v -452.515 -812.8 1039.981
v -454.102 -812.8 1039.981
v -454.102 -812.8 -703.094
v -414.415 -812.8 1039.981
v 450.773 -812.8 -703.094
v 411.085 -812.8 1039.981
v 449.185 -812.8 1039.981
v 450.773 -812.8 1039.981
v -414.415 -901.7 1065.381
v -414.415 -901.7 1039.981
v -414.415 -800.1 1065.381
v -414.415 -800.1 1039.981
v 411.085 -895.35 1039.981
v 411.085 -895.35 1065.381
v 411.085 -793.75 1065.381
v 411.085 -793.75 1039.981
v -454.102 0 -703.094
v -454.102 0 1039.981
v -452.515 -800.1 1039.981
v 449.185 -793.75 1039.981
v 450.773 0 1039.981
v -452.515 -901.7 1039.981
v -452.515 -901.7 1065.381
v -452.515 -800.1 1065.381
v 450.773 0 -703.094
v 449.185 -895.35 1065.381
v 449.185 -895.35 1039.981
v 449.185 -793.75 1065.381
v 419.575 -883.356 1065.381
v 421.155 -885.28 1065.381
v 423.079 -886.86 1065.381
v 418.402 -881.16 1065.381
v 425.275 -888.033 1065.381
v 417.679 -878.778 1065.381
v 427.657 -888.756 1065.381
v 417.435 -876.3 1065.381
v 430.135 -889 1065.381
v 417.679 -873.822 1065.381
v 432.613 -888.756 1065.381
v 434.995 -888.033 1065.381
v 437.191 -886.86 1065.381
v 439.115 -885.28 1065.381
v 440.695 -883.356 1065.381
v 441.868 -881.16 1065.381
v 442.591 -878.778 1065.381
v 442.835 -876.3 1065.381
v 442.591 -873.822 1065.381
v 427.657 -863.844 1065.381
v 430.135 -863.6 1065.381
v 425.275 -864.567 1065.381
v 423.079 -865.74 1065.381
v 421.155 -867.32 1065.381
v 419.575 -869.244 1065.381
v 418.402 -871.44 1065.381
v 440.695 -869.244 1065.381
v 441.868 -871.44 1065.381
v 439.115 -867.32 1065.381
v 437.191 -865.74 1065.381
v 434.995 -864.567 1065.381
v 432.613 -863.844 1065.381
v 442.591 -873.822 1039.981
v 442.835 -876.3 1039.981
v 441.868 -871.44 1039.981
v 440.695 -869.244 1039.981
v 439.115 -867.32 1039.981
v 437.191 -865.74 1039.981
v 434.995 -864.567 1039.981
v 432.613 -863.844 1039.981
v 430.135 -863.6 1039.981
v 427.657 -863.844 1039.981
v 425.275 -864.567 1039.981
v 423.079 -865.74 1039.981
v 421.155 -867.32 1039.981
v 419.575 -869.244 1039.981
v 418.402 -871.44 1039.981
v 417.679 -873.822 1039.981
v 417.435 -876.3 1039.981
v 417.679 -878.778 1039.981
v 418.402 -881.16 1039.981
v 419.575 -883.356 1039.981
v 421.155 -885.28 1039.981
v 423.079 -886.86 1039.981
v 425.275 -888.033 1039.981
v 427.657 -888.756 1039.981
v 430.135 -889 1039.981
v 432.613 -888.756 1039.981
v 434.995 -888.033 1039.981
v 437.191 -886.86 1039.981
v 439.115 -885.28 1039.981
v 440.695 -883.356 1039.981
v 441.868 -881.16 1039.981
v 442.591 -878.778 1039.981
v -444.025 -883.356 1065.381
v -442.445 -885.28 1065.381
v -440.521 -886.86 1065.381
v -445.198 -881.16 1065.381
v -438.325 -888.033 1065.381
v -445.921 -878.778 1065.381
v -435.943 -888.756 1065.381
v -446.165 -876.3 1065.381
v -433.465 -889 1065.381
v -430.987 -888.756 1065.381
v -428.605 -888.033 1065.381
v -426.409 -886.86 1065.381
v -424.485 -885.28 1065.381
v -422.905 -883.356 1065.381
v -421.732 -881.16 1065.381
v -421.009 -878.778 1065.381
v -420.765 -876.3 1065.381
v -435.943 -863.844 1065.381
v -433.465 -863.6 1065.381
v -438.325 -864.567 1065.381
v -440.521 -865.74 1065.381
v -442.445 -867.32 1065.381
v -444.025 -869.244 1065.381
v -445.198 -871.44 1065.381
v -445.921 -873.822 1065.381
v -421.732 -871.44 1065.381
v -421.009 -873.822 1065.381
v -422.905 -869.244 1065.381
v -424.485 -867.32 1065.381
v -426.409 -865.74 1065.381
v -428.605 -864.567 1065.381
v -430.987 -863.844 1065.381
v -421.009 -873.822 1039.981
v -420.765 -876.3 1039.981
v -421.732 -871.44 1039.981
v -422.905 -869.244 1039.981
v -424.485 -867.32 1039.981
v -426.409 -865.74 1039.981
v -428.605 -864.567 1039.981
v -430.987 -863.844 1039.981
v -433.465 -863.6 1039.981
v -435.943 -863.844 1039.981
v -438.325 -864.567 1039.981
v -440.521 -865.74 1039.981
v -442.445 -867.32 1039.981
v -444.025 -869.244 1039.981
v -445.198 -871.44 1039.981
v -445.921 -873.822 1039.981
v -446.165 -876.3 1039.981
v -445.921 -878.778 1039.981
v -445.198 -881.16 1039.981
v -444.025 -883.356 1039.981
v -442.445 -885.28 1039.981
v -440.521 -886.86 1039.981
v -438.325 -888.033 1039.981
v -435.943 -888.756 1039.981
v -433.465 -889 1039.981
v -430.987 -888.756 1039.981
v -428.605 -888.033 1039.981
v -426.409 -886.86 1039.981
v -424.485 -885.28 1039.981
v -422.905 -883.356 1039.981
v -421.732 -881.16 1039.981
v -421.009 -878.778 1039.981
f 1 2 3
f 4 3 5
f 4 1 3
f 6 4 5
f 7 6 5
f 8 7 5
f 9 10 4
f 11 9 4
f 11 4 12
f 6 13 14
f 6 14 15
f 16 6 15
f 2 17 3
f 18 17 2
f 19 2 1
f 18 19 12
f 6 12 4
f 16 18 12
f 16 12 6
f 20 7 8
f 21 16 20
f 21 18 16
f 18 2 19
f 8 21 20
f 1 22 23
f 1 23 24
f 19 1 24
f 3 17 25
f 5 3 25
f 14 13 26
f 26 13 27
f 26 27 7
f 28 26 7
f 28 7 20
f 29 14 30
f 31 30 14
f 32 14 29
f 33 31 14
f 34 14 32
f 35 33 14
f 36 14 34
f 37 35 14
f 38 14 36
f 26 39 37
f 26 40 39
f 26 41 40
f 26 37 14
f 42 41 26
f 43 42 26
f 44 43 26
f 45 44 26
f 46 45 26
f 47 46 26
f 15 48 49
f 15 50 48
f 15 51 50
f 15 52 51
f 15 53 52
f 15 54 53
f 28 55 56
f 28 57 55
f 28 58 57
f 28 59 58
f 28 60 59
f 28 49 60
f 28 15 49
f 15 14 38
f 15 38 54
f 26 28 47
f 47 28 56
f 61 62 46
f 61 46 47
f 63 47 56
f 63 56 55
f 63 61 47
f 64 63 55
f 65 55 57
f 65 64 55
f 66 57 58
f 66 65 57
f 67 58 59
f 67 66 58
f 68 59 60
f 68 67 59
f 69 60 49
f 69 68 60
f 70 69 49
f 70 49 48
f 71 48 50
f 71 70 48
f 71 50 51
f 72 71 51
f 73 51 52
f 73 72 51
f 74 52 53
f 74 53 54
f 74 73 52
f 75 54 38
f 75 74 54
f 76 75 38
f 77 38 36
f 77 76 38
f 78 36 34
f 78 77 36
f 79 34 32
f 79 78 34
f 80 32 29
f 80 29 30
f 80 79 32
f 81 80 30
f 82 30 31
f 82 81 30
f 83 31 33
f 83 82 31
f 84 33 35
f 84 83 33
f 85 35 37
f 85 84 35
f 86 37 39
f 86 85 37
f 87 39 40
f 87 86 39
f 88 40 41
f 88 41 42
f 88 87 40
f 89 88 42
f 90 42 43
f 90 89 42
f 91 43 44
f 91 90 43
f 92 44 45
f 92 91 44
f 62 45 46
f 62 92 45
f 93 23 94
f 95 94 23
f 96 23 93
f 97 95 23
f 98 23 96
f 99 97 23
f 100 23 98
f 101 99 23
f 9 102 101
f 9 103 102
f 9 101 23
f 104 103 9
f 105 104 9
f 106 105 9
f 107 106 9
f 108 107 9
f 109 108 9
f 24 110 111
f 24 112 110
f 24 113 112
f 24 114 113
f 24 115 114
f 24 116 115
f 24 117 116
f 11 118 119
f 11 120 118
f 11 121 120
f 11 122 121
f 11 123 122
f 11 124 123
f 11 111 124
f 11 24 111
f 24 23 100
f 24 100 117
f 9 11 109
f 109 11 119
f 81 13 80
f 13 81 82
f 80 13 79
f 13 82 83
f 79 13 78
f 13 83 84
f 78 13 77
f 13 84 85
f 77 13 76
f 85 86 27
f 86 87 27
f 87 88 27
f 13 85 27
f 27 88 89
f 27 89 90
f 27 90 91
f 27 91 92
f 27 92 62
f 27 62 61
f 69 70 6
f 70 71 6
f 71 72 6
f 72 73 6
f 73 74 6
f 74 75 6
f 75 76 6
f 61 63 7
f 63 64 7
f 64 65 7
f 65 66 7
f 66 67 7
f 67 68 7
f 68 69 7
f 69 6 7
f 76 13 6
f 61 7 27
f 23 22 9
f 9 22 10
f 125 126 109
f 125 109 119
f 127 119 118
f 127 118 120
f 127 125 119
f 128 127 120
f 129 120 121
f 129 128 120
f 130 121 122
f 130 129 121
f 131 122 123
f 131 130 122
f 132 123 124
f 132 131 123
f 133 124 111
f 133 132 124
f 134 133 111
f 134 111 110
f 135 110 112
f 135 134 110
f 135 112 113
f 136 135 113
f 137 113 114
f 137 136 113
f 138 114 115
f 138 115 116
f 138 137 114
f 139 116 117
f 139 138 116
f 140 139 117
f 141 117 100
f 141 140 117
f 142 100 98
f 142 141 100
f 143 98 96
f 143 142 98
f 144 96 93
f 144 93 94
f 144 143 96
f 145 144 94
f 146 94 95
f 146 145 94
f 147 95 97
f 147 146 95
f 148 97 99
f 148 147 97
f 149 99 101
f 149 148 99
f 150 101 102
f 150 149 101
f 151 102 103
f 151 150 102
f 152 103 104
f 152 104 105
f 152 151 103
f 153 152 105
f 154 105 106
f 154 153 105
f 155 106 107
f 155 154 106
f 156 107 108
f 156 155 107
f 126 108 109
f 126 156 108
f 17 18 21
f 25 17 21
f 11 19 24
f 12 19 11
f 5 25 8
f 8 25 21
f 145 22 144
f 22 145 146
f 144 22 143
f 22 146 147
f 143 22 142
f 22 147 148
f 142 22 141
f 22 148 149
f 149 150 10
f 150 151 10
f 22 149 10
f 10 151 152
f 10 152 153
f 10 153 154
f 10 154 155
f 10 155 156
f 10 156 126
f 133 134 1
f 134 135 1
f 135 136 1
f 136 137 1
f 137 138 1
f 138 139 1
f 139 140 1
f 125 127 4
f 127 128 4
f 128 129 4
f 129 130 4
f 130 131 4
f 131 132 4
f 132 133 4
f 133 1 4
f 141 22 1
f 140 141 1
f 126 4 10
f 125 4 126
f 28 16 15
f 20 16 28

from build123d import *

# Parameters (mm, degrees)
F0_W     = 904.875
F0_H     = 1743.075
F1_DEPTH = 812.8
F2_W     = 38.1
F2_H     = 101.6
F2_R     = 12.7
F3_DEPTH = 25.4


with BuildPart() as f1:
    # F0 (on Front) → F1 (new body)
    with BuildSketch(Plane.XZ):
        with Locations((-1.664946, 168.443598)):
            Rectangle(F0_W, F0_H)
    extrude(amount=F1_DEPTH)

    # F2 (on face) → F3 (join)
    with BuildSketch(Plane.XY.offset(1039.981098)):
        with Locations((-433.464946, -850.9)):
            Rectangle(F2_W, F2_H)
        with Locations((-433.464946, -876.3)):
            Circle(F2_R, mode=Mode.SUBTRACT)
        with Locations((430.135054, -844.55)):
            Rectangle(F2_W, F2_H)
        with Locations((430.135054, -876.3)):
            Circle(F2_R, mode=Mode.SUBTRACT)
    extrude(amount=F3_DEPTH)


solid = f1.part
